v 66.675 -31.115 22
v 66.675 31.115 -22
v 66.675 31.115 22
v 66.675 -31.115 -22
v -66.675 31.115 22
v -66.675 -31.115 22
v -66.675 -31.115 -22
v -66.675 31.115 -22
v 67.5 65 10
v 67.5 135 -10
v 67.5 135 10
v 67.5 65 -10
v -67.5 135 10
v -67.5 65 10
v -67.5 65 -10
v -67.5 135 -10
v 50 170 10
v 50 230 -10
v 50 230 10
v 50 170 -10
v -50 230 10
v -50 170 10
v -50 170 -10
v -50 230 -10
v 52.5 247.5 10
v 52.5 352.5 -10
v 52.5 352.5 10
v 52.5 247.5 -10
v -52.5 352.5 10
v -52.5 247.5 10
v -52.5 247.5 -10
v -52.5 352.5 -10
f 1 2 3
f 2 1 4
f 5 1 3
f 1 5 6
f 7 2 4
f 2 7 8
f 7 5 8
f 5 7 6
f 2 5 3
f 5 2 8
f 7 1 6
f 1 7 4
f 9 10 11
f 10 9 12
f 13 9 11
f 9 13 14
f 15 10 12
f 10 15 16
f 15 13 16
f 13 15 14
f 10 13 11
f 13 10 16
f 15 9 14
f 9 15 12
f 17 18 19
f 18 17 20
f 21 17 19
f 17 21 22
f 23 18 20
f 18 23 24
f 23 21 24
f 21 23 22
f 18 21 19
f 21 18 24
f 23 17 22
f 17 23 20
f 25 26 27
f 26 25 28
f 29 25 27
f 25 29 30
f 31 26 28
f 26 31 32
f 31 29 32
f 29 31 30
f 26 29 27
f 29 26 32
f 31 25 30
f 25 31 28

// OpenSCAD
// To do : get fixing points

module ramps() {
	color("Green") cube([5.25*25.4,2.45*25.4,44],true);
}

module rumba() {
	color("White") cube([135,70,20],true);
}

module printrboard() {
	color("DimGrey") cube([100,60,20],true);
}

module smoothieboard() {
	color("black") cube([105,105,20],true);
}

ramps();
translate ([0,100,0,]) rumba();
translate ([0,200,0,]) printrboard();
translate ([0,300,0,]) smoothieboard();
